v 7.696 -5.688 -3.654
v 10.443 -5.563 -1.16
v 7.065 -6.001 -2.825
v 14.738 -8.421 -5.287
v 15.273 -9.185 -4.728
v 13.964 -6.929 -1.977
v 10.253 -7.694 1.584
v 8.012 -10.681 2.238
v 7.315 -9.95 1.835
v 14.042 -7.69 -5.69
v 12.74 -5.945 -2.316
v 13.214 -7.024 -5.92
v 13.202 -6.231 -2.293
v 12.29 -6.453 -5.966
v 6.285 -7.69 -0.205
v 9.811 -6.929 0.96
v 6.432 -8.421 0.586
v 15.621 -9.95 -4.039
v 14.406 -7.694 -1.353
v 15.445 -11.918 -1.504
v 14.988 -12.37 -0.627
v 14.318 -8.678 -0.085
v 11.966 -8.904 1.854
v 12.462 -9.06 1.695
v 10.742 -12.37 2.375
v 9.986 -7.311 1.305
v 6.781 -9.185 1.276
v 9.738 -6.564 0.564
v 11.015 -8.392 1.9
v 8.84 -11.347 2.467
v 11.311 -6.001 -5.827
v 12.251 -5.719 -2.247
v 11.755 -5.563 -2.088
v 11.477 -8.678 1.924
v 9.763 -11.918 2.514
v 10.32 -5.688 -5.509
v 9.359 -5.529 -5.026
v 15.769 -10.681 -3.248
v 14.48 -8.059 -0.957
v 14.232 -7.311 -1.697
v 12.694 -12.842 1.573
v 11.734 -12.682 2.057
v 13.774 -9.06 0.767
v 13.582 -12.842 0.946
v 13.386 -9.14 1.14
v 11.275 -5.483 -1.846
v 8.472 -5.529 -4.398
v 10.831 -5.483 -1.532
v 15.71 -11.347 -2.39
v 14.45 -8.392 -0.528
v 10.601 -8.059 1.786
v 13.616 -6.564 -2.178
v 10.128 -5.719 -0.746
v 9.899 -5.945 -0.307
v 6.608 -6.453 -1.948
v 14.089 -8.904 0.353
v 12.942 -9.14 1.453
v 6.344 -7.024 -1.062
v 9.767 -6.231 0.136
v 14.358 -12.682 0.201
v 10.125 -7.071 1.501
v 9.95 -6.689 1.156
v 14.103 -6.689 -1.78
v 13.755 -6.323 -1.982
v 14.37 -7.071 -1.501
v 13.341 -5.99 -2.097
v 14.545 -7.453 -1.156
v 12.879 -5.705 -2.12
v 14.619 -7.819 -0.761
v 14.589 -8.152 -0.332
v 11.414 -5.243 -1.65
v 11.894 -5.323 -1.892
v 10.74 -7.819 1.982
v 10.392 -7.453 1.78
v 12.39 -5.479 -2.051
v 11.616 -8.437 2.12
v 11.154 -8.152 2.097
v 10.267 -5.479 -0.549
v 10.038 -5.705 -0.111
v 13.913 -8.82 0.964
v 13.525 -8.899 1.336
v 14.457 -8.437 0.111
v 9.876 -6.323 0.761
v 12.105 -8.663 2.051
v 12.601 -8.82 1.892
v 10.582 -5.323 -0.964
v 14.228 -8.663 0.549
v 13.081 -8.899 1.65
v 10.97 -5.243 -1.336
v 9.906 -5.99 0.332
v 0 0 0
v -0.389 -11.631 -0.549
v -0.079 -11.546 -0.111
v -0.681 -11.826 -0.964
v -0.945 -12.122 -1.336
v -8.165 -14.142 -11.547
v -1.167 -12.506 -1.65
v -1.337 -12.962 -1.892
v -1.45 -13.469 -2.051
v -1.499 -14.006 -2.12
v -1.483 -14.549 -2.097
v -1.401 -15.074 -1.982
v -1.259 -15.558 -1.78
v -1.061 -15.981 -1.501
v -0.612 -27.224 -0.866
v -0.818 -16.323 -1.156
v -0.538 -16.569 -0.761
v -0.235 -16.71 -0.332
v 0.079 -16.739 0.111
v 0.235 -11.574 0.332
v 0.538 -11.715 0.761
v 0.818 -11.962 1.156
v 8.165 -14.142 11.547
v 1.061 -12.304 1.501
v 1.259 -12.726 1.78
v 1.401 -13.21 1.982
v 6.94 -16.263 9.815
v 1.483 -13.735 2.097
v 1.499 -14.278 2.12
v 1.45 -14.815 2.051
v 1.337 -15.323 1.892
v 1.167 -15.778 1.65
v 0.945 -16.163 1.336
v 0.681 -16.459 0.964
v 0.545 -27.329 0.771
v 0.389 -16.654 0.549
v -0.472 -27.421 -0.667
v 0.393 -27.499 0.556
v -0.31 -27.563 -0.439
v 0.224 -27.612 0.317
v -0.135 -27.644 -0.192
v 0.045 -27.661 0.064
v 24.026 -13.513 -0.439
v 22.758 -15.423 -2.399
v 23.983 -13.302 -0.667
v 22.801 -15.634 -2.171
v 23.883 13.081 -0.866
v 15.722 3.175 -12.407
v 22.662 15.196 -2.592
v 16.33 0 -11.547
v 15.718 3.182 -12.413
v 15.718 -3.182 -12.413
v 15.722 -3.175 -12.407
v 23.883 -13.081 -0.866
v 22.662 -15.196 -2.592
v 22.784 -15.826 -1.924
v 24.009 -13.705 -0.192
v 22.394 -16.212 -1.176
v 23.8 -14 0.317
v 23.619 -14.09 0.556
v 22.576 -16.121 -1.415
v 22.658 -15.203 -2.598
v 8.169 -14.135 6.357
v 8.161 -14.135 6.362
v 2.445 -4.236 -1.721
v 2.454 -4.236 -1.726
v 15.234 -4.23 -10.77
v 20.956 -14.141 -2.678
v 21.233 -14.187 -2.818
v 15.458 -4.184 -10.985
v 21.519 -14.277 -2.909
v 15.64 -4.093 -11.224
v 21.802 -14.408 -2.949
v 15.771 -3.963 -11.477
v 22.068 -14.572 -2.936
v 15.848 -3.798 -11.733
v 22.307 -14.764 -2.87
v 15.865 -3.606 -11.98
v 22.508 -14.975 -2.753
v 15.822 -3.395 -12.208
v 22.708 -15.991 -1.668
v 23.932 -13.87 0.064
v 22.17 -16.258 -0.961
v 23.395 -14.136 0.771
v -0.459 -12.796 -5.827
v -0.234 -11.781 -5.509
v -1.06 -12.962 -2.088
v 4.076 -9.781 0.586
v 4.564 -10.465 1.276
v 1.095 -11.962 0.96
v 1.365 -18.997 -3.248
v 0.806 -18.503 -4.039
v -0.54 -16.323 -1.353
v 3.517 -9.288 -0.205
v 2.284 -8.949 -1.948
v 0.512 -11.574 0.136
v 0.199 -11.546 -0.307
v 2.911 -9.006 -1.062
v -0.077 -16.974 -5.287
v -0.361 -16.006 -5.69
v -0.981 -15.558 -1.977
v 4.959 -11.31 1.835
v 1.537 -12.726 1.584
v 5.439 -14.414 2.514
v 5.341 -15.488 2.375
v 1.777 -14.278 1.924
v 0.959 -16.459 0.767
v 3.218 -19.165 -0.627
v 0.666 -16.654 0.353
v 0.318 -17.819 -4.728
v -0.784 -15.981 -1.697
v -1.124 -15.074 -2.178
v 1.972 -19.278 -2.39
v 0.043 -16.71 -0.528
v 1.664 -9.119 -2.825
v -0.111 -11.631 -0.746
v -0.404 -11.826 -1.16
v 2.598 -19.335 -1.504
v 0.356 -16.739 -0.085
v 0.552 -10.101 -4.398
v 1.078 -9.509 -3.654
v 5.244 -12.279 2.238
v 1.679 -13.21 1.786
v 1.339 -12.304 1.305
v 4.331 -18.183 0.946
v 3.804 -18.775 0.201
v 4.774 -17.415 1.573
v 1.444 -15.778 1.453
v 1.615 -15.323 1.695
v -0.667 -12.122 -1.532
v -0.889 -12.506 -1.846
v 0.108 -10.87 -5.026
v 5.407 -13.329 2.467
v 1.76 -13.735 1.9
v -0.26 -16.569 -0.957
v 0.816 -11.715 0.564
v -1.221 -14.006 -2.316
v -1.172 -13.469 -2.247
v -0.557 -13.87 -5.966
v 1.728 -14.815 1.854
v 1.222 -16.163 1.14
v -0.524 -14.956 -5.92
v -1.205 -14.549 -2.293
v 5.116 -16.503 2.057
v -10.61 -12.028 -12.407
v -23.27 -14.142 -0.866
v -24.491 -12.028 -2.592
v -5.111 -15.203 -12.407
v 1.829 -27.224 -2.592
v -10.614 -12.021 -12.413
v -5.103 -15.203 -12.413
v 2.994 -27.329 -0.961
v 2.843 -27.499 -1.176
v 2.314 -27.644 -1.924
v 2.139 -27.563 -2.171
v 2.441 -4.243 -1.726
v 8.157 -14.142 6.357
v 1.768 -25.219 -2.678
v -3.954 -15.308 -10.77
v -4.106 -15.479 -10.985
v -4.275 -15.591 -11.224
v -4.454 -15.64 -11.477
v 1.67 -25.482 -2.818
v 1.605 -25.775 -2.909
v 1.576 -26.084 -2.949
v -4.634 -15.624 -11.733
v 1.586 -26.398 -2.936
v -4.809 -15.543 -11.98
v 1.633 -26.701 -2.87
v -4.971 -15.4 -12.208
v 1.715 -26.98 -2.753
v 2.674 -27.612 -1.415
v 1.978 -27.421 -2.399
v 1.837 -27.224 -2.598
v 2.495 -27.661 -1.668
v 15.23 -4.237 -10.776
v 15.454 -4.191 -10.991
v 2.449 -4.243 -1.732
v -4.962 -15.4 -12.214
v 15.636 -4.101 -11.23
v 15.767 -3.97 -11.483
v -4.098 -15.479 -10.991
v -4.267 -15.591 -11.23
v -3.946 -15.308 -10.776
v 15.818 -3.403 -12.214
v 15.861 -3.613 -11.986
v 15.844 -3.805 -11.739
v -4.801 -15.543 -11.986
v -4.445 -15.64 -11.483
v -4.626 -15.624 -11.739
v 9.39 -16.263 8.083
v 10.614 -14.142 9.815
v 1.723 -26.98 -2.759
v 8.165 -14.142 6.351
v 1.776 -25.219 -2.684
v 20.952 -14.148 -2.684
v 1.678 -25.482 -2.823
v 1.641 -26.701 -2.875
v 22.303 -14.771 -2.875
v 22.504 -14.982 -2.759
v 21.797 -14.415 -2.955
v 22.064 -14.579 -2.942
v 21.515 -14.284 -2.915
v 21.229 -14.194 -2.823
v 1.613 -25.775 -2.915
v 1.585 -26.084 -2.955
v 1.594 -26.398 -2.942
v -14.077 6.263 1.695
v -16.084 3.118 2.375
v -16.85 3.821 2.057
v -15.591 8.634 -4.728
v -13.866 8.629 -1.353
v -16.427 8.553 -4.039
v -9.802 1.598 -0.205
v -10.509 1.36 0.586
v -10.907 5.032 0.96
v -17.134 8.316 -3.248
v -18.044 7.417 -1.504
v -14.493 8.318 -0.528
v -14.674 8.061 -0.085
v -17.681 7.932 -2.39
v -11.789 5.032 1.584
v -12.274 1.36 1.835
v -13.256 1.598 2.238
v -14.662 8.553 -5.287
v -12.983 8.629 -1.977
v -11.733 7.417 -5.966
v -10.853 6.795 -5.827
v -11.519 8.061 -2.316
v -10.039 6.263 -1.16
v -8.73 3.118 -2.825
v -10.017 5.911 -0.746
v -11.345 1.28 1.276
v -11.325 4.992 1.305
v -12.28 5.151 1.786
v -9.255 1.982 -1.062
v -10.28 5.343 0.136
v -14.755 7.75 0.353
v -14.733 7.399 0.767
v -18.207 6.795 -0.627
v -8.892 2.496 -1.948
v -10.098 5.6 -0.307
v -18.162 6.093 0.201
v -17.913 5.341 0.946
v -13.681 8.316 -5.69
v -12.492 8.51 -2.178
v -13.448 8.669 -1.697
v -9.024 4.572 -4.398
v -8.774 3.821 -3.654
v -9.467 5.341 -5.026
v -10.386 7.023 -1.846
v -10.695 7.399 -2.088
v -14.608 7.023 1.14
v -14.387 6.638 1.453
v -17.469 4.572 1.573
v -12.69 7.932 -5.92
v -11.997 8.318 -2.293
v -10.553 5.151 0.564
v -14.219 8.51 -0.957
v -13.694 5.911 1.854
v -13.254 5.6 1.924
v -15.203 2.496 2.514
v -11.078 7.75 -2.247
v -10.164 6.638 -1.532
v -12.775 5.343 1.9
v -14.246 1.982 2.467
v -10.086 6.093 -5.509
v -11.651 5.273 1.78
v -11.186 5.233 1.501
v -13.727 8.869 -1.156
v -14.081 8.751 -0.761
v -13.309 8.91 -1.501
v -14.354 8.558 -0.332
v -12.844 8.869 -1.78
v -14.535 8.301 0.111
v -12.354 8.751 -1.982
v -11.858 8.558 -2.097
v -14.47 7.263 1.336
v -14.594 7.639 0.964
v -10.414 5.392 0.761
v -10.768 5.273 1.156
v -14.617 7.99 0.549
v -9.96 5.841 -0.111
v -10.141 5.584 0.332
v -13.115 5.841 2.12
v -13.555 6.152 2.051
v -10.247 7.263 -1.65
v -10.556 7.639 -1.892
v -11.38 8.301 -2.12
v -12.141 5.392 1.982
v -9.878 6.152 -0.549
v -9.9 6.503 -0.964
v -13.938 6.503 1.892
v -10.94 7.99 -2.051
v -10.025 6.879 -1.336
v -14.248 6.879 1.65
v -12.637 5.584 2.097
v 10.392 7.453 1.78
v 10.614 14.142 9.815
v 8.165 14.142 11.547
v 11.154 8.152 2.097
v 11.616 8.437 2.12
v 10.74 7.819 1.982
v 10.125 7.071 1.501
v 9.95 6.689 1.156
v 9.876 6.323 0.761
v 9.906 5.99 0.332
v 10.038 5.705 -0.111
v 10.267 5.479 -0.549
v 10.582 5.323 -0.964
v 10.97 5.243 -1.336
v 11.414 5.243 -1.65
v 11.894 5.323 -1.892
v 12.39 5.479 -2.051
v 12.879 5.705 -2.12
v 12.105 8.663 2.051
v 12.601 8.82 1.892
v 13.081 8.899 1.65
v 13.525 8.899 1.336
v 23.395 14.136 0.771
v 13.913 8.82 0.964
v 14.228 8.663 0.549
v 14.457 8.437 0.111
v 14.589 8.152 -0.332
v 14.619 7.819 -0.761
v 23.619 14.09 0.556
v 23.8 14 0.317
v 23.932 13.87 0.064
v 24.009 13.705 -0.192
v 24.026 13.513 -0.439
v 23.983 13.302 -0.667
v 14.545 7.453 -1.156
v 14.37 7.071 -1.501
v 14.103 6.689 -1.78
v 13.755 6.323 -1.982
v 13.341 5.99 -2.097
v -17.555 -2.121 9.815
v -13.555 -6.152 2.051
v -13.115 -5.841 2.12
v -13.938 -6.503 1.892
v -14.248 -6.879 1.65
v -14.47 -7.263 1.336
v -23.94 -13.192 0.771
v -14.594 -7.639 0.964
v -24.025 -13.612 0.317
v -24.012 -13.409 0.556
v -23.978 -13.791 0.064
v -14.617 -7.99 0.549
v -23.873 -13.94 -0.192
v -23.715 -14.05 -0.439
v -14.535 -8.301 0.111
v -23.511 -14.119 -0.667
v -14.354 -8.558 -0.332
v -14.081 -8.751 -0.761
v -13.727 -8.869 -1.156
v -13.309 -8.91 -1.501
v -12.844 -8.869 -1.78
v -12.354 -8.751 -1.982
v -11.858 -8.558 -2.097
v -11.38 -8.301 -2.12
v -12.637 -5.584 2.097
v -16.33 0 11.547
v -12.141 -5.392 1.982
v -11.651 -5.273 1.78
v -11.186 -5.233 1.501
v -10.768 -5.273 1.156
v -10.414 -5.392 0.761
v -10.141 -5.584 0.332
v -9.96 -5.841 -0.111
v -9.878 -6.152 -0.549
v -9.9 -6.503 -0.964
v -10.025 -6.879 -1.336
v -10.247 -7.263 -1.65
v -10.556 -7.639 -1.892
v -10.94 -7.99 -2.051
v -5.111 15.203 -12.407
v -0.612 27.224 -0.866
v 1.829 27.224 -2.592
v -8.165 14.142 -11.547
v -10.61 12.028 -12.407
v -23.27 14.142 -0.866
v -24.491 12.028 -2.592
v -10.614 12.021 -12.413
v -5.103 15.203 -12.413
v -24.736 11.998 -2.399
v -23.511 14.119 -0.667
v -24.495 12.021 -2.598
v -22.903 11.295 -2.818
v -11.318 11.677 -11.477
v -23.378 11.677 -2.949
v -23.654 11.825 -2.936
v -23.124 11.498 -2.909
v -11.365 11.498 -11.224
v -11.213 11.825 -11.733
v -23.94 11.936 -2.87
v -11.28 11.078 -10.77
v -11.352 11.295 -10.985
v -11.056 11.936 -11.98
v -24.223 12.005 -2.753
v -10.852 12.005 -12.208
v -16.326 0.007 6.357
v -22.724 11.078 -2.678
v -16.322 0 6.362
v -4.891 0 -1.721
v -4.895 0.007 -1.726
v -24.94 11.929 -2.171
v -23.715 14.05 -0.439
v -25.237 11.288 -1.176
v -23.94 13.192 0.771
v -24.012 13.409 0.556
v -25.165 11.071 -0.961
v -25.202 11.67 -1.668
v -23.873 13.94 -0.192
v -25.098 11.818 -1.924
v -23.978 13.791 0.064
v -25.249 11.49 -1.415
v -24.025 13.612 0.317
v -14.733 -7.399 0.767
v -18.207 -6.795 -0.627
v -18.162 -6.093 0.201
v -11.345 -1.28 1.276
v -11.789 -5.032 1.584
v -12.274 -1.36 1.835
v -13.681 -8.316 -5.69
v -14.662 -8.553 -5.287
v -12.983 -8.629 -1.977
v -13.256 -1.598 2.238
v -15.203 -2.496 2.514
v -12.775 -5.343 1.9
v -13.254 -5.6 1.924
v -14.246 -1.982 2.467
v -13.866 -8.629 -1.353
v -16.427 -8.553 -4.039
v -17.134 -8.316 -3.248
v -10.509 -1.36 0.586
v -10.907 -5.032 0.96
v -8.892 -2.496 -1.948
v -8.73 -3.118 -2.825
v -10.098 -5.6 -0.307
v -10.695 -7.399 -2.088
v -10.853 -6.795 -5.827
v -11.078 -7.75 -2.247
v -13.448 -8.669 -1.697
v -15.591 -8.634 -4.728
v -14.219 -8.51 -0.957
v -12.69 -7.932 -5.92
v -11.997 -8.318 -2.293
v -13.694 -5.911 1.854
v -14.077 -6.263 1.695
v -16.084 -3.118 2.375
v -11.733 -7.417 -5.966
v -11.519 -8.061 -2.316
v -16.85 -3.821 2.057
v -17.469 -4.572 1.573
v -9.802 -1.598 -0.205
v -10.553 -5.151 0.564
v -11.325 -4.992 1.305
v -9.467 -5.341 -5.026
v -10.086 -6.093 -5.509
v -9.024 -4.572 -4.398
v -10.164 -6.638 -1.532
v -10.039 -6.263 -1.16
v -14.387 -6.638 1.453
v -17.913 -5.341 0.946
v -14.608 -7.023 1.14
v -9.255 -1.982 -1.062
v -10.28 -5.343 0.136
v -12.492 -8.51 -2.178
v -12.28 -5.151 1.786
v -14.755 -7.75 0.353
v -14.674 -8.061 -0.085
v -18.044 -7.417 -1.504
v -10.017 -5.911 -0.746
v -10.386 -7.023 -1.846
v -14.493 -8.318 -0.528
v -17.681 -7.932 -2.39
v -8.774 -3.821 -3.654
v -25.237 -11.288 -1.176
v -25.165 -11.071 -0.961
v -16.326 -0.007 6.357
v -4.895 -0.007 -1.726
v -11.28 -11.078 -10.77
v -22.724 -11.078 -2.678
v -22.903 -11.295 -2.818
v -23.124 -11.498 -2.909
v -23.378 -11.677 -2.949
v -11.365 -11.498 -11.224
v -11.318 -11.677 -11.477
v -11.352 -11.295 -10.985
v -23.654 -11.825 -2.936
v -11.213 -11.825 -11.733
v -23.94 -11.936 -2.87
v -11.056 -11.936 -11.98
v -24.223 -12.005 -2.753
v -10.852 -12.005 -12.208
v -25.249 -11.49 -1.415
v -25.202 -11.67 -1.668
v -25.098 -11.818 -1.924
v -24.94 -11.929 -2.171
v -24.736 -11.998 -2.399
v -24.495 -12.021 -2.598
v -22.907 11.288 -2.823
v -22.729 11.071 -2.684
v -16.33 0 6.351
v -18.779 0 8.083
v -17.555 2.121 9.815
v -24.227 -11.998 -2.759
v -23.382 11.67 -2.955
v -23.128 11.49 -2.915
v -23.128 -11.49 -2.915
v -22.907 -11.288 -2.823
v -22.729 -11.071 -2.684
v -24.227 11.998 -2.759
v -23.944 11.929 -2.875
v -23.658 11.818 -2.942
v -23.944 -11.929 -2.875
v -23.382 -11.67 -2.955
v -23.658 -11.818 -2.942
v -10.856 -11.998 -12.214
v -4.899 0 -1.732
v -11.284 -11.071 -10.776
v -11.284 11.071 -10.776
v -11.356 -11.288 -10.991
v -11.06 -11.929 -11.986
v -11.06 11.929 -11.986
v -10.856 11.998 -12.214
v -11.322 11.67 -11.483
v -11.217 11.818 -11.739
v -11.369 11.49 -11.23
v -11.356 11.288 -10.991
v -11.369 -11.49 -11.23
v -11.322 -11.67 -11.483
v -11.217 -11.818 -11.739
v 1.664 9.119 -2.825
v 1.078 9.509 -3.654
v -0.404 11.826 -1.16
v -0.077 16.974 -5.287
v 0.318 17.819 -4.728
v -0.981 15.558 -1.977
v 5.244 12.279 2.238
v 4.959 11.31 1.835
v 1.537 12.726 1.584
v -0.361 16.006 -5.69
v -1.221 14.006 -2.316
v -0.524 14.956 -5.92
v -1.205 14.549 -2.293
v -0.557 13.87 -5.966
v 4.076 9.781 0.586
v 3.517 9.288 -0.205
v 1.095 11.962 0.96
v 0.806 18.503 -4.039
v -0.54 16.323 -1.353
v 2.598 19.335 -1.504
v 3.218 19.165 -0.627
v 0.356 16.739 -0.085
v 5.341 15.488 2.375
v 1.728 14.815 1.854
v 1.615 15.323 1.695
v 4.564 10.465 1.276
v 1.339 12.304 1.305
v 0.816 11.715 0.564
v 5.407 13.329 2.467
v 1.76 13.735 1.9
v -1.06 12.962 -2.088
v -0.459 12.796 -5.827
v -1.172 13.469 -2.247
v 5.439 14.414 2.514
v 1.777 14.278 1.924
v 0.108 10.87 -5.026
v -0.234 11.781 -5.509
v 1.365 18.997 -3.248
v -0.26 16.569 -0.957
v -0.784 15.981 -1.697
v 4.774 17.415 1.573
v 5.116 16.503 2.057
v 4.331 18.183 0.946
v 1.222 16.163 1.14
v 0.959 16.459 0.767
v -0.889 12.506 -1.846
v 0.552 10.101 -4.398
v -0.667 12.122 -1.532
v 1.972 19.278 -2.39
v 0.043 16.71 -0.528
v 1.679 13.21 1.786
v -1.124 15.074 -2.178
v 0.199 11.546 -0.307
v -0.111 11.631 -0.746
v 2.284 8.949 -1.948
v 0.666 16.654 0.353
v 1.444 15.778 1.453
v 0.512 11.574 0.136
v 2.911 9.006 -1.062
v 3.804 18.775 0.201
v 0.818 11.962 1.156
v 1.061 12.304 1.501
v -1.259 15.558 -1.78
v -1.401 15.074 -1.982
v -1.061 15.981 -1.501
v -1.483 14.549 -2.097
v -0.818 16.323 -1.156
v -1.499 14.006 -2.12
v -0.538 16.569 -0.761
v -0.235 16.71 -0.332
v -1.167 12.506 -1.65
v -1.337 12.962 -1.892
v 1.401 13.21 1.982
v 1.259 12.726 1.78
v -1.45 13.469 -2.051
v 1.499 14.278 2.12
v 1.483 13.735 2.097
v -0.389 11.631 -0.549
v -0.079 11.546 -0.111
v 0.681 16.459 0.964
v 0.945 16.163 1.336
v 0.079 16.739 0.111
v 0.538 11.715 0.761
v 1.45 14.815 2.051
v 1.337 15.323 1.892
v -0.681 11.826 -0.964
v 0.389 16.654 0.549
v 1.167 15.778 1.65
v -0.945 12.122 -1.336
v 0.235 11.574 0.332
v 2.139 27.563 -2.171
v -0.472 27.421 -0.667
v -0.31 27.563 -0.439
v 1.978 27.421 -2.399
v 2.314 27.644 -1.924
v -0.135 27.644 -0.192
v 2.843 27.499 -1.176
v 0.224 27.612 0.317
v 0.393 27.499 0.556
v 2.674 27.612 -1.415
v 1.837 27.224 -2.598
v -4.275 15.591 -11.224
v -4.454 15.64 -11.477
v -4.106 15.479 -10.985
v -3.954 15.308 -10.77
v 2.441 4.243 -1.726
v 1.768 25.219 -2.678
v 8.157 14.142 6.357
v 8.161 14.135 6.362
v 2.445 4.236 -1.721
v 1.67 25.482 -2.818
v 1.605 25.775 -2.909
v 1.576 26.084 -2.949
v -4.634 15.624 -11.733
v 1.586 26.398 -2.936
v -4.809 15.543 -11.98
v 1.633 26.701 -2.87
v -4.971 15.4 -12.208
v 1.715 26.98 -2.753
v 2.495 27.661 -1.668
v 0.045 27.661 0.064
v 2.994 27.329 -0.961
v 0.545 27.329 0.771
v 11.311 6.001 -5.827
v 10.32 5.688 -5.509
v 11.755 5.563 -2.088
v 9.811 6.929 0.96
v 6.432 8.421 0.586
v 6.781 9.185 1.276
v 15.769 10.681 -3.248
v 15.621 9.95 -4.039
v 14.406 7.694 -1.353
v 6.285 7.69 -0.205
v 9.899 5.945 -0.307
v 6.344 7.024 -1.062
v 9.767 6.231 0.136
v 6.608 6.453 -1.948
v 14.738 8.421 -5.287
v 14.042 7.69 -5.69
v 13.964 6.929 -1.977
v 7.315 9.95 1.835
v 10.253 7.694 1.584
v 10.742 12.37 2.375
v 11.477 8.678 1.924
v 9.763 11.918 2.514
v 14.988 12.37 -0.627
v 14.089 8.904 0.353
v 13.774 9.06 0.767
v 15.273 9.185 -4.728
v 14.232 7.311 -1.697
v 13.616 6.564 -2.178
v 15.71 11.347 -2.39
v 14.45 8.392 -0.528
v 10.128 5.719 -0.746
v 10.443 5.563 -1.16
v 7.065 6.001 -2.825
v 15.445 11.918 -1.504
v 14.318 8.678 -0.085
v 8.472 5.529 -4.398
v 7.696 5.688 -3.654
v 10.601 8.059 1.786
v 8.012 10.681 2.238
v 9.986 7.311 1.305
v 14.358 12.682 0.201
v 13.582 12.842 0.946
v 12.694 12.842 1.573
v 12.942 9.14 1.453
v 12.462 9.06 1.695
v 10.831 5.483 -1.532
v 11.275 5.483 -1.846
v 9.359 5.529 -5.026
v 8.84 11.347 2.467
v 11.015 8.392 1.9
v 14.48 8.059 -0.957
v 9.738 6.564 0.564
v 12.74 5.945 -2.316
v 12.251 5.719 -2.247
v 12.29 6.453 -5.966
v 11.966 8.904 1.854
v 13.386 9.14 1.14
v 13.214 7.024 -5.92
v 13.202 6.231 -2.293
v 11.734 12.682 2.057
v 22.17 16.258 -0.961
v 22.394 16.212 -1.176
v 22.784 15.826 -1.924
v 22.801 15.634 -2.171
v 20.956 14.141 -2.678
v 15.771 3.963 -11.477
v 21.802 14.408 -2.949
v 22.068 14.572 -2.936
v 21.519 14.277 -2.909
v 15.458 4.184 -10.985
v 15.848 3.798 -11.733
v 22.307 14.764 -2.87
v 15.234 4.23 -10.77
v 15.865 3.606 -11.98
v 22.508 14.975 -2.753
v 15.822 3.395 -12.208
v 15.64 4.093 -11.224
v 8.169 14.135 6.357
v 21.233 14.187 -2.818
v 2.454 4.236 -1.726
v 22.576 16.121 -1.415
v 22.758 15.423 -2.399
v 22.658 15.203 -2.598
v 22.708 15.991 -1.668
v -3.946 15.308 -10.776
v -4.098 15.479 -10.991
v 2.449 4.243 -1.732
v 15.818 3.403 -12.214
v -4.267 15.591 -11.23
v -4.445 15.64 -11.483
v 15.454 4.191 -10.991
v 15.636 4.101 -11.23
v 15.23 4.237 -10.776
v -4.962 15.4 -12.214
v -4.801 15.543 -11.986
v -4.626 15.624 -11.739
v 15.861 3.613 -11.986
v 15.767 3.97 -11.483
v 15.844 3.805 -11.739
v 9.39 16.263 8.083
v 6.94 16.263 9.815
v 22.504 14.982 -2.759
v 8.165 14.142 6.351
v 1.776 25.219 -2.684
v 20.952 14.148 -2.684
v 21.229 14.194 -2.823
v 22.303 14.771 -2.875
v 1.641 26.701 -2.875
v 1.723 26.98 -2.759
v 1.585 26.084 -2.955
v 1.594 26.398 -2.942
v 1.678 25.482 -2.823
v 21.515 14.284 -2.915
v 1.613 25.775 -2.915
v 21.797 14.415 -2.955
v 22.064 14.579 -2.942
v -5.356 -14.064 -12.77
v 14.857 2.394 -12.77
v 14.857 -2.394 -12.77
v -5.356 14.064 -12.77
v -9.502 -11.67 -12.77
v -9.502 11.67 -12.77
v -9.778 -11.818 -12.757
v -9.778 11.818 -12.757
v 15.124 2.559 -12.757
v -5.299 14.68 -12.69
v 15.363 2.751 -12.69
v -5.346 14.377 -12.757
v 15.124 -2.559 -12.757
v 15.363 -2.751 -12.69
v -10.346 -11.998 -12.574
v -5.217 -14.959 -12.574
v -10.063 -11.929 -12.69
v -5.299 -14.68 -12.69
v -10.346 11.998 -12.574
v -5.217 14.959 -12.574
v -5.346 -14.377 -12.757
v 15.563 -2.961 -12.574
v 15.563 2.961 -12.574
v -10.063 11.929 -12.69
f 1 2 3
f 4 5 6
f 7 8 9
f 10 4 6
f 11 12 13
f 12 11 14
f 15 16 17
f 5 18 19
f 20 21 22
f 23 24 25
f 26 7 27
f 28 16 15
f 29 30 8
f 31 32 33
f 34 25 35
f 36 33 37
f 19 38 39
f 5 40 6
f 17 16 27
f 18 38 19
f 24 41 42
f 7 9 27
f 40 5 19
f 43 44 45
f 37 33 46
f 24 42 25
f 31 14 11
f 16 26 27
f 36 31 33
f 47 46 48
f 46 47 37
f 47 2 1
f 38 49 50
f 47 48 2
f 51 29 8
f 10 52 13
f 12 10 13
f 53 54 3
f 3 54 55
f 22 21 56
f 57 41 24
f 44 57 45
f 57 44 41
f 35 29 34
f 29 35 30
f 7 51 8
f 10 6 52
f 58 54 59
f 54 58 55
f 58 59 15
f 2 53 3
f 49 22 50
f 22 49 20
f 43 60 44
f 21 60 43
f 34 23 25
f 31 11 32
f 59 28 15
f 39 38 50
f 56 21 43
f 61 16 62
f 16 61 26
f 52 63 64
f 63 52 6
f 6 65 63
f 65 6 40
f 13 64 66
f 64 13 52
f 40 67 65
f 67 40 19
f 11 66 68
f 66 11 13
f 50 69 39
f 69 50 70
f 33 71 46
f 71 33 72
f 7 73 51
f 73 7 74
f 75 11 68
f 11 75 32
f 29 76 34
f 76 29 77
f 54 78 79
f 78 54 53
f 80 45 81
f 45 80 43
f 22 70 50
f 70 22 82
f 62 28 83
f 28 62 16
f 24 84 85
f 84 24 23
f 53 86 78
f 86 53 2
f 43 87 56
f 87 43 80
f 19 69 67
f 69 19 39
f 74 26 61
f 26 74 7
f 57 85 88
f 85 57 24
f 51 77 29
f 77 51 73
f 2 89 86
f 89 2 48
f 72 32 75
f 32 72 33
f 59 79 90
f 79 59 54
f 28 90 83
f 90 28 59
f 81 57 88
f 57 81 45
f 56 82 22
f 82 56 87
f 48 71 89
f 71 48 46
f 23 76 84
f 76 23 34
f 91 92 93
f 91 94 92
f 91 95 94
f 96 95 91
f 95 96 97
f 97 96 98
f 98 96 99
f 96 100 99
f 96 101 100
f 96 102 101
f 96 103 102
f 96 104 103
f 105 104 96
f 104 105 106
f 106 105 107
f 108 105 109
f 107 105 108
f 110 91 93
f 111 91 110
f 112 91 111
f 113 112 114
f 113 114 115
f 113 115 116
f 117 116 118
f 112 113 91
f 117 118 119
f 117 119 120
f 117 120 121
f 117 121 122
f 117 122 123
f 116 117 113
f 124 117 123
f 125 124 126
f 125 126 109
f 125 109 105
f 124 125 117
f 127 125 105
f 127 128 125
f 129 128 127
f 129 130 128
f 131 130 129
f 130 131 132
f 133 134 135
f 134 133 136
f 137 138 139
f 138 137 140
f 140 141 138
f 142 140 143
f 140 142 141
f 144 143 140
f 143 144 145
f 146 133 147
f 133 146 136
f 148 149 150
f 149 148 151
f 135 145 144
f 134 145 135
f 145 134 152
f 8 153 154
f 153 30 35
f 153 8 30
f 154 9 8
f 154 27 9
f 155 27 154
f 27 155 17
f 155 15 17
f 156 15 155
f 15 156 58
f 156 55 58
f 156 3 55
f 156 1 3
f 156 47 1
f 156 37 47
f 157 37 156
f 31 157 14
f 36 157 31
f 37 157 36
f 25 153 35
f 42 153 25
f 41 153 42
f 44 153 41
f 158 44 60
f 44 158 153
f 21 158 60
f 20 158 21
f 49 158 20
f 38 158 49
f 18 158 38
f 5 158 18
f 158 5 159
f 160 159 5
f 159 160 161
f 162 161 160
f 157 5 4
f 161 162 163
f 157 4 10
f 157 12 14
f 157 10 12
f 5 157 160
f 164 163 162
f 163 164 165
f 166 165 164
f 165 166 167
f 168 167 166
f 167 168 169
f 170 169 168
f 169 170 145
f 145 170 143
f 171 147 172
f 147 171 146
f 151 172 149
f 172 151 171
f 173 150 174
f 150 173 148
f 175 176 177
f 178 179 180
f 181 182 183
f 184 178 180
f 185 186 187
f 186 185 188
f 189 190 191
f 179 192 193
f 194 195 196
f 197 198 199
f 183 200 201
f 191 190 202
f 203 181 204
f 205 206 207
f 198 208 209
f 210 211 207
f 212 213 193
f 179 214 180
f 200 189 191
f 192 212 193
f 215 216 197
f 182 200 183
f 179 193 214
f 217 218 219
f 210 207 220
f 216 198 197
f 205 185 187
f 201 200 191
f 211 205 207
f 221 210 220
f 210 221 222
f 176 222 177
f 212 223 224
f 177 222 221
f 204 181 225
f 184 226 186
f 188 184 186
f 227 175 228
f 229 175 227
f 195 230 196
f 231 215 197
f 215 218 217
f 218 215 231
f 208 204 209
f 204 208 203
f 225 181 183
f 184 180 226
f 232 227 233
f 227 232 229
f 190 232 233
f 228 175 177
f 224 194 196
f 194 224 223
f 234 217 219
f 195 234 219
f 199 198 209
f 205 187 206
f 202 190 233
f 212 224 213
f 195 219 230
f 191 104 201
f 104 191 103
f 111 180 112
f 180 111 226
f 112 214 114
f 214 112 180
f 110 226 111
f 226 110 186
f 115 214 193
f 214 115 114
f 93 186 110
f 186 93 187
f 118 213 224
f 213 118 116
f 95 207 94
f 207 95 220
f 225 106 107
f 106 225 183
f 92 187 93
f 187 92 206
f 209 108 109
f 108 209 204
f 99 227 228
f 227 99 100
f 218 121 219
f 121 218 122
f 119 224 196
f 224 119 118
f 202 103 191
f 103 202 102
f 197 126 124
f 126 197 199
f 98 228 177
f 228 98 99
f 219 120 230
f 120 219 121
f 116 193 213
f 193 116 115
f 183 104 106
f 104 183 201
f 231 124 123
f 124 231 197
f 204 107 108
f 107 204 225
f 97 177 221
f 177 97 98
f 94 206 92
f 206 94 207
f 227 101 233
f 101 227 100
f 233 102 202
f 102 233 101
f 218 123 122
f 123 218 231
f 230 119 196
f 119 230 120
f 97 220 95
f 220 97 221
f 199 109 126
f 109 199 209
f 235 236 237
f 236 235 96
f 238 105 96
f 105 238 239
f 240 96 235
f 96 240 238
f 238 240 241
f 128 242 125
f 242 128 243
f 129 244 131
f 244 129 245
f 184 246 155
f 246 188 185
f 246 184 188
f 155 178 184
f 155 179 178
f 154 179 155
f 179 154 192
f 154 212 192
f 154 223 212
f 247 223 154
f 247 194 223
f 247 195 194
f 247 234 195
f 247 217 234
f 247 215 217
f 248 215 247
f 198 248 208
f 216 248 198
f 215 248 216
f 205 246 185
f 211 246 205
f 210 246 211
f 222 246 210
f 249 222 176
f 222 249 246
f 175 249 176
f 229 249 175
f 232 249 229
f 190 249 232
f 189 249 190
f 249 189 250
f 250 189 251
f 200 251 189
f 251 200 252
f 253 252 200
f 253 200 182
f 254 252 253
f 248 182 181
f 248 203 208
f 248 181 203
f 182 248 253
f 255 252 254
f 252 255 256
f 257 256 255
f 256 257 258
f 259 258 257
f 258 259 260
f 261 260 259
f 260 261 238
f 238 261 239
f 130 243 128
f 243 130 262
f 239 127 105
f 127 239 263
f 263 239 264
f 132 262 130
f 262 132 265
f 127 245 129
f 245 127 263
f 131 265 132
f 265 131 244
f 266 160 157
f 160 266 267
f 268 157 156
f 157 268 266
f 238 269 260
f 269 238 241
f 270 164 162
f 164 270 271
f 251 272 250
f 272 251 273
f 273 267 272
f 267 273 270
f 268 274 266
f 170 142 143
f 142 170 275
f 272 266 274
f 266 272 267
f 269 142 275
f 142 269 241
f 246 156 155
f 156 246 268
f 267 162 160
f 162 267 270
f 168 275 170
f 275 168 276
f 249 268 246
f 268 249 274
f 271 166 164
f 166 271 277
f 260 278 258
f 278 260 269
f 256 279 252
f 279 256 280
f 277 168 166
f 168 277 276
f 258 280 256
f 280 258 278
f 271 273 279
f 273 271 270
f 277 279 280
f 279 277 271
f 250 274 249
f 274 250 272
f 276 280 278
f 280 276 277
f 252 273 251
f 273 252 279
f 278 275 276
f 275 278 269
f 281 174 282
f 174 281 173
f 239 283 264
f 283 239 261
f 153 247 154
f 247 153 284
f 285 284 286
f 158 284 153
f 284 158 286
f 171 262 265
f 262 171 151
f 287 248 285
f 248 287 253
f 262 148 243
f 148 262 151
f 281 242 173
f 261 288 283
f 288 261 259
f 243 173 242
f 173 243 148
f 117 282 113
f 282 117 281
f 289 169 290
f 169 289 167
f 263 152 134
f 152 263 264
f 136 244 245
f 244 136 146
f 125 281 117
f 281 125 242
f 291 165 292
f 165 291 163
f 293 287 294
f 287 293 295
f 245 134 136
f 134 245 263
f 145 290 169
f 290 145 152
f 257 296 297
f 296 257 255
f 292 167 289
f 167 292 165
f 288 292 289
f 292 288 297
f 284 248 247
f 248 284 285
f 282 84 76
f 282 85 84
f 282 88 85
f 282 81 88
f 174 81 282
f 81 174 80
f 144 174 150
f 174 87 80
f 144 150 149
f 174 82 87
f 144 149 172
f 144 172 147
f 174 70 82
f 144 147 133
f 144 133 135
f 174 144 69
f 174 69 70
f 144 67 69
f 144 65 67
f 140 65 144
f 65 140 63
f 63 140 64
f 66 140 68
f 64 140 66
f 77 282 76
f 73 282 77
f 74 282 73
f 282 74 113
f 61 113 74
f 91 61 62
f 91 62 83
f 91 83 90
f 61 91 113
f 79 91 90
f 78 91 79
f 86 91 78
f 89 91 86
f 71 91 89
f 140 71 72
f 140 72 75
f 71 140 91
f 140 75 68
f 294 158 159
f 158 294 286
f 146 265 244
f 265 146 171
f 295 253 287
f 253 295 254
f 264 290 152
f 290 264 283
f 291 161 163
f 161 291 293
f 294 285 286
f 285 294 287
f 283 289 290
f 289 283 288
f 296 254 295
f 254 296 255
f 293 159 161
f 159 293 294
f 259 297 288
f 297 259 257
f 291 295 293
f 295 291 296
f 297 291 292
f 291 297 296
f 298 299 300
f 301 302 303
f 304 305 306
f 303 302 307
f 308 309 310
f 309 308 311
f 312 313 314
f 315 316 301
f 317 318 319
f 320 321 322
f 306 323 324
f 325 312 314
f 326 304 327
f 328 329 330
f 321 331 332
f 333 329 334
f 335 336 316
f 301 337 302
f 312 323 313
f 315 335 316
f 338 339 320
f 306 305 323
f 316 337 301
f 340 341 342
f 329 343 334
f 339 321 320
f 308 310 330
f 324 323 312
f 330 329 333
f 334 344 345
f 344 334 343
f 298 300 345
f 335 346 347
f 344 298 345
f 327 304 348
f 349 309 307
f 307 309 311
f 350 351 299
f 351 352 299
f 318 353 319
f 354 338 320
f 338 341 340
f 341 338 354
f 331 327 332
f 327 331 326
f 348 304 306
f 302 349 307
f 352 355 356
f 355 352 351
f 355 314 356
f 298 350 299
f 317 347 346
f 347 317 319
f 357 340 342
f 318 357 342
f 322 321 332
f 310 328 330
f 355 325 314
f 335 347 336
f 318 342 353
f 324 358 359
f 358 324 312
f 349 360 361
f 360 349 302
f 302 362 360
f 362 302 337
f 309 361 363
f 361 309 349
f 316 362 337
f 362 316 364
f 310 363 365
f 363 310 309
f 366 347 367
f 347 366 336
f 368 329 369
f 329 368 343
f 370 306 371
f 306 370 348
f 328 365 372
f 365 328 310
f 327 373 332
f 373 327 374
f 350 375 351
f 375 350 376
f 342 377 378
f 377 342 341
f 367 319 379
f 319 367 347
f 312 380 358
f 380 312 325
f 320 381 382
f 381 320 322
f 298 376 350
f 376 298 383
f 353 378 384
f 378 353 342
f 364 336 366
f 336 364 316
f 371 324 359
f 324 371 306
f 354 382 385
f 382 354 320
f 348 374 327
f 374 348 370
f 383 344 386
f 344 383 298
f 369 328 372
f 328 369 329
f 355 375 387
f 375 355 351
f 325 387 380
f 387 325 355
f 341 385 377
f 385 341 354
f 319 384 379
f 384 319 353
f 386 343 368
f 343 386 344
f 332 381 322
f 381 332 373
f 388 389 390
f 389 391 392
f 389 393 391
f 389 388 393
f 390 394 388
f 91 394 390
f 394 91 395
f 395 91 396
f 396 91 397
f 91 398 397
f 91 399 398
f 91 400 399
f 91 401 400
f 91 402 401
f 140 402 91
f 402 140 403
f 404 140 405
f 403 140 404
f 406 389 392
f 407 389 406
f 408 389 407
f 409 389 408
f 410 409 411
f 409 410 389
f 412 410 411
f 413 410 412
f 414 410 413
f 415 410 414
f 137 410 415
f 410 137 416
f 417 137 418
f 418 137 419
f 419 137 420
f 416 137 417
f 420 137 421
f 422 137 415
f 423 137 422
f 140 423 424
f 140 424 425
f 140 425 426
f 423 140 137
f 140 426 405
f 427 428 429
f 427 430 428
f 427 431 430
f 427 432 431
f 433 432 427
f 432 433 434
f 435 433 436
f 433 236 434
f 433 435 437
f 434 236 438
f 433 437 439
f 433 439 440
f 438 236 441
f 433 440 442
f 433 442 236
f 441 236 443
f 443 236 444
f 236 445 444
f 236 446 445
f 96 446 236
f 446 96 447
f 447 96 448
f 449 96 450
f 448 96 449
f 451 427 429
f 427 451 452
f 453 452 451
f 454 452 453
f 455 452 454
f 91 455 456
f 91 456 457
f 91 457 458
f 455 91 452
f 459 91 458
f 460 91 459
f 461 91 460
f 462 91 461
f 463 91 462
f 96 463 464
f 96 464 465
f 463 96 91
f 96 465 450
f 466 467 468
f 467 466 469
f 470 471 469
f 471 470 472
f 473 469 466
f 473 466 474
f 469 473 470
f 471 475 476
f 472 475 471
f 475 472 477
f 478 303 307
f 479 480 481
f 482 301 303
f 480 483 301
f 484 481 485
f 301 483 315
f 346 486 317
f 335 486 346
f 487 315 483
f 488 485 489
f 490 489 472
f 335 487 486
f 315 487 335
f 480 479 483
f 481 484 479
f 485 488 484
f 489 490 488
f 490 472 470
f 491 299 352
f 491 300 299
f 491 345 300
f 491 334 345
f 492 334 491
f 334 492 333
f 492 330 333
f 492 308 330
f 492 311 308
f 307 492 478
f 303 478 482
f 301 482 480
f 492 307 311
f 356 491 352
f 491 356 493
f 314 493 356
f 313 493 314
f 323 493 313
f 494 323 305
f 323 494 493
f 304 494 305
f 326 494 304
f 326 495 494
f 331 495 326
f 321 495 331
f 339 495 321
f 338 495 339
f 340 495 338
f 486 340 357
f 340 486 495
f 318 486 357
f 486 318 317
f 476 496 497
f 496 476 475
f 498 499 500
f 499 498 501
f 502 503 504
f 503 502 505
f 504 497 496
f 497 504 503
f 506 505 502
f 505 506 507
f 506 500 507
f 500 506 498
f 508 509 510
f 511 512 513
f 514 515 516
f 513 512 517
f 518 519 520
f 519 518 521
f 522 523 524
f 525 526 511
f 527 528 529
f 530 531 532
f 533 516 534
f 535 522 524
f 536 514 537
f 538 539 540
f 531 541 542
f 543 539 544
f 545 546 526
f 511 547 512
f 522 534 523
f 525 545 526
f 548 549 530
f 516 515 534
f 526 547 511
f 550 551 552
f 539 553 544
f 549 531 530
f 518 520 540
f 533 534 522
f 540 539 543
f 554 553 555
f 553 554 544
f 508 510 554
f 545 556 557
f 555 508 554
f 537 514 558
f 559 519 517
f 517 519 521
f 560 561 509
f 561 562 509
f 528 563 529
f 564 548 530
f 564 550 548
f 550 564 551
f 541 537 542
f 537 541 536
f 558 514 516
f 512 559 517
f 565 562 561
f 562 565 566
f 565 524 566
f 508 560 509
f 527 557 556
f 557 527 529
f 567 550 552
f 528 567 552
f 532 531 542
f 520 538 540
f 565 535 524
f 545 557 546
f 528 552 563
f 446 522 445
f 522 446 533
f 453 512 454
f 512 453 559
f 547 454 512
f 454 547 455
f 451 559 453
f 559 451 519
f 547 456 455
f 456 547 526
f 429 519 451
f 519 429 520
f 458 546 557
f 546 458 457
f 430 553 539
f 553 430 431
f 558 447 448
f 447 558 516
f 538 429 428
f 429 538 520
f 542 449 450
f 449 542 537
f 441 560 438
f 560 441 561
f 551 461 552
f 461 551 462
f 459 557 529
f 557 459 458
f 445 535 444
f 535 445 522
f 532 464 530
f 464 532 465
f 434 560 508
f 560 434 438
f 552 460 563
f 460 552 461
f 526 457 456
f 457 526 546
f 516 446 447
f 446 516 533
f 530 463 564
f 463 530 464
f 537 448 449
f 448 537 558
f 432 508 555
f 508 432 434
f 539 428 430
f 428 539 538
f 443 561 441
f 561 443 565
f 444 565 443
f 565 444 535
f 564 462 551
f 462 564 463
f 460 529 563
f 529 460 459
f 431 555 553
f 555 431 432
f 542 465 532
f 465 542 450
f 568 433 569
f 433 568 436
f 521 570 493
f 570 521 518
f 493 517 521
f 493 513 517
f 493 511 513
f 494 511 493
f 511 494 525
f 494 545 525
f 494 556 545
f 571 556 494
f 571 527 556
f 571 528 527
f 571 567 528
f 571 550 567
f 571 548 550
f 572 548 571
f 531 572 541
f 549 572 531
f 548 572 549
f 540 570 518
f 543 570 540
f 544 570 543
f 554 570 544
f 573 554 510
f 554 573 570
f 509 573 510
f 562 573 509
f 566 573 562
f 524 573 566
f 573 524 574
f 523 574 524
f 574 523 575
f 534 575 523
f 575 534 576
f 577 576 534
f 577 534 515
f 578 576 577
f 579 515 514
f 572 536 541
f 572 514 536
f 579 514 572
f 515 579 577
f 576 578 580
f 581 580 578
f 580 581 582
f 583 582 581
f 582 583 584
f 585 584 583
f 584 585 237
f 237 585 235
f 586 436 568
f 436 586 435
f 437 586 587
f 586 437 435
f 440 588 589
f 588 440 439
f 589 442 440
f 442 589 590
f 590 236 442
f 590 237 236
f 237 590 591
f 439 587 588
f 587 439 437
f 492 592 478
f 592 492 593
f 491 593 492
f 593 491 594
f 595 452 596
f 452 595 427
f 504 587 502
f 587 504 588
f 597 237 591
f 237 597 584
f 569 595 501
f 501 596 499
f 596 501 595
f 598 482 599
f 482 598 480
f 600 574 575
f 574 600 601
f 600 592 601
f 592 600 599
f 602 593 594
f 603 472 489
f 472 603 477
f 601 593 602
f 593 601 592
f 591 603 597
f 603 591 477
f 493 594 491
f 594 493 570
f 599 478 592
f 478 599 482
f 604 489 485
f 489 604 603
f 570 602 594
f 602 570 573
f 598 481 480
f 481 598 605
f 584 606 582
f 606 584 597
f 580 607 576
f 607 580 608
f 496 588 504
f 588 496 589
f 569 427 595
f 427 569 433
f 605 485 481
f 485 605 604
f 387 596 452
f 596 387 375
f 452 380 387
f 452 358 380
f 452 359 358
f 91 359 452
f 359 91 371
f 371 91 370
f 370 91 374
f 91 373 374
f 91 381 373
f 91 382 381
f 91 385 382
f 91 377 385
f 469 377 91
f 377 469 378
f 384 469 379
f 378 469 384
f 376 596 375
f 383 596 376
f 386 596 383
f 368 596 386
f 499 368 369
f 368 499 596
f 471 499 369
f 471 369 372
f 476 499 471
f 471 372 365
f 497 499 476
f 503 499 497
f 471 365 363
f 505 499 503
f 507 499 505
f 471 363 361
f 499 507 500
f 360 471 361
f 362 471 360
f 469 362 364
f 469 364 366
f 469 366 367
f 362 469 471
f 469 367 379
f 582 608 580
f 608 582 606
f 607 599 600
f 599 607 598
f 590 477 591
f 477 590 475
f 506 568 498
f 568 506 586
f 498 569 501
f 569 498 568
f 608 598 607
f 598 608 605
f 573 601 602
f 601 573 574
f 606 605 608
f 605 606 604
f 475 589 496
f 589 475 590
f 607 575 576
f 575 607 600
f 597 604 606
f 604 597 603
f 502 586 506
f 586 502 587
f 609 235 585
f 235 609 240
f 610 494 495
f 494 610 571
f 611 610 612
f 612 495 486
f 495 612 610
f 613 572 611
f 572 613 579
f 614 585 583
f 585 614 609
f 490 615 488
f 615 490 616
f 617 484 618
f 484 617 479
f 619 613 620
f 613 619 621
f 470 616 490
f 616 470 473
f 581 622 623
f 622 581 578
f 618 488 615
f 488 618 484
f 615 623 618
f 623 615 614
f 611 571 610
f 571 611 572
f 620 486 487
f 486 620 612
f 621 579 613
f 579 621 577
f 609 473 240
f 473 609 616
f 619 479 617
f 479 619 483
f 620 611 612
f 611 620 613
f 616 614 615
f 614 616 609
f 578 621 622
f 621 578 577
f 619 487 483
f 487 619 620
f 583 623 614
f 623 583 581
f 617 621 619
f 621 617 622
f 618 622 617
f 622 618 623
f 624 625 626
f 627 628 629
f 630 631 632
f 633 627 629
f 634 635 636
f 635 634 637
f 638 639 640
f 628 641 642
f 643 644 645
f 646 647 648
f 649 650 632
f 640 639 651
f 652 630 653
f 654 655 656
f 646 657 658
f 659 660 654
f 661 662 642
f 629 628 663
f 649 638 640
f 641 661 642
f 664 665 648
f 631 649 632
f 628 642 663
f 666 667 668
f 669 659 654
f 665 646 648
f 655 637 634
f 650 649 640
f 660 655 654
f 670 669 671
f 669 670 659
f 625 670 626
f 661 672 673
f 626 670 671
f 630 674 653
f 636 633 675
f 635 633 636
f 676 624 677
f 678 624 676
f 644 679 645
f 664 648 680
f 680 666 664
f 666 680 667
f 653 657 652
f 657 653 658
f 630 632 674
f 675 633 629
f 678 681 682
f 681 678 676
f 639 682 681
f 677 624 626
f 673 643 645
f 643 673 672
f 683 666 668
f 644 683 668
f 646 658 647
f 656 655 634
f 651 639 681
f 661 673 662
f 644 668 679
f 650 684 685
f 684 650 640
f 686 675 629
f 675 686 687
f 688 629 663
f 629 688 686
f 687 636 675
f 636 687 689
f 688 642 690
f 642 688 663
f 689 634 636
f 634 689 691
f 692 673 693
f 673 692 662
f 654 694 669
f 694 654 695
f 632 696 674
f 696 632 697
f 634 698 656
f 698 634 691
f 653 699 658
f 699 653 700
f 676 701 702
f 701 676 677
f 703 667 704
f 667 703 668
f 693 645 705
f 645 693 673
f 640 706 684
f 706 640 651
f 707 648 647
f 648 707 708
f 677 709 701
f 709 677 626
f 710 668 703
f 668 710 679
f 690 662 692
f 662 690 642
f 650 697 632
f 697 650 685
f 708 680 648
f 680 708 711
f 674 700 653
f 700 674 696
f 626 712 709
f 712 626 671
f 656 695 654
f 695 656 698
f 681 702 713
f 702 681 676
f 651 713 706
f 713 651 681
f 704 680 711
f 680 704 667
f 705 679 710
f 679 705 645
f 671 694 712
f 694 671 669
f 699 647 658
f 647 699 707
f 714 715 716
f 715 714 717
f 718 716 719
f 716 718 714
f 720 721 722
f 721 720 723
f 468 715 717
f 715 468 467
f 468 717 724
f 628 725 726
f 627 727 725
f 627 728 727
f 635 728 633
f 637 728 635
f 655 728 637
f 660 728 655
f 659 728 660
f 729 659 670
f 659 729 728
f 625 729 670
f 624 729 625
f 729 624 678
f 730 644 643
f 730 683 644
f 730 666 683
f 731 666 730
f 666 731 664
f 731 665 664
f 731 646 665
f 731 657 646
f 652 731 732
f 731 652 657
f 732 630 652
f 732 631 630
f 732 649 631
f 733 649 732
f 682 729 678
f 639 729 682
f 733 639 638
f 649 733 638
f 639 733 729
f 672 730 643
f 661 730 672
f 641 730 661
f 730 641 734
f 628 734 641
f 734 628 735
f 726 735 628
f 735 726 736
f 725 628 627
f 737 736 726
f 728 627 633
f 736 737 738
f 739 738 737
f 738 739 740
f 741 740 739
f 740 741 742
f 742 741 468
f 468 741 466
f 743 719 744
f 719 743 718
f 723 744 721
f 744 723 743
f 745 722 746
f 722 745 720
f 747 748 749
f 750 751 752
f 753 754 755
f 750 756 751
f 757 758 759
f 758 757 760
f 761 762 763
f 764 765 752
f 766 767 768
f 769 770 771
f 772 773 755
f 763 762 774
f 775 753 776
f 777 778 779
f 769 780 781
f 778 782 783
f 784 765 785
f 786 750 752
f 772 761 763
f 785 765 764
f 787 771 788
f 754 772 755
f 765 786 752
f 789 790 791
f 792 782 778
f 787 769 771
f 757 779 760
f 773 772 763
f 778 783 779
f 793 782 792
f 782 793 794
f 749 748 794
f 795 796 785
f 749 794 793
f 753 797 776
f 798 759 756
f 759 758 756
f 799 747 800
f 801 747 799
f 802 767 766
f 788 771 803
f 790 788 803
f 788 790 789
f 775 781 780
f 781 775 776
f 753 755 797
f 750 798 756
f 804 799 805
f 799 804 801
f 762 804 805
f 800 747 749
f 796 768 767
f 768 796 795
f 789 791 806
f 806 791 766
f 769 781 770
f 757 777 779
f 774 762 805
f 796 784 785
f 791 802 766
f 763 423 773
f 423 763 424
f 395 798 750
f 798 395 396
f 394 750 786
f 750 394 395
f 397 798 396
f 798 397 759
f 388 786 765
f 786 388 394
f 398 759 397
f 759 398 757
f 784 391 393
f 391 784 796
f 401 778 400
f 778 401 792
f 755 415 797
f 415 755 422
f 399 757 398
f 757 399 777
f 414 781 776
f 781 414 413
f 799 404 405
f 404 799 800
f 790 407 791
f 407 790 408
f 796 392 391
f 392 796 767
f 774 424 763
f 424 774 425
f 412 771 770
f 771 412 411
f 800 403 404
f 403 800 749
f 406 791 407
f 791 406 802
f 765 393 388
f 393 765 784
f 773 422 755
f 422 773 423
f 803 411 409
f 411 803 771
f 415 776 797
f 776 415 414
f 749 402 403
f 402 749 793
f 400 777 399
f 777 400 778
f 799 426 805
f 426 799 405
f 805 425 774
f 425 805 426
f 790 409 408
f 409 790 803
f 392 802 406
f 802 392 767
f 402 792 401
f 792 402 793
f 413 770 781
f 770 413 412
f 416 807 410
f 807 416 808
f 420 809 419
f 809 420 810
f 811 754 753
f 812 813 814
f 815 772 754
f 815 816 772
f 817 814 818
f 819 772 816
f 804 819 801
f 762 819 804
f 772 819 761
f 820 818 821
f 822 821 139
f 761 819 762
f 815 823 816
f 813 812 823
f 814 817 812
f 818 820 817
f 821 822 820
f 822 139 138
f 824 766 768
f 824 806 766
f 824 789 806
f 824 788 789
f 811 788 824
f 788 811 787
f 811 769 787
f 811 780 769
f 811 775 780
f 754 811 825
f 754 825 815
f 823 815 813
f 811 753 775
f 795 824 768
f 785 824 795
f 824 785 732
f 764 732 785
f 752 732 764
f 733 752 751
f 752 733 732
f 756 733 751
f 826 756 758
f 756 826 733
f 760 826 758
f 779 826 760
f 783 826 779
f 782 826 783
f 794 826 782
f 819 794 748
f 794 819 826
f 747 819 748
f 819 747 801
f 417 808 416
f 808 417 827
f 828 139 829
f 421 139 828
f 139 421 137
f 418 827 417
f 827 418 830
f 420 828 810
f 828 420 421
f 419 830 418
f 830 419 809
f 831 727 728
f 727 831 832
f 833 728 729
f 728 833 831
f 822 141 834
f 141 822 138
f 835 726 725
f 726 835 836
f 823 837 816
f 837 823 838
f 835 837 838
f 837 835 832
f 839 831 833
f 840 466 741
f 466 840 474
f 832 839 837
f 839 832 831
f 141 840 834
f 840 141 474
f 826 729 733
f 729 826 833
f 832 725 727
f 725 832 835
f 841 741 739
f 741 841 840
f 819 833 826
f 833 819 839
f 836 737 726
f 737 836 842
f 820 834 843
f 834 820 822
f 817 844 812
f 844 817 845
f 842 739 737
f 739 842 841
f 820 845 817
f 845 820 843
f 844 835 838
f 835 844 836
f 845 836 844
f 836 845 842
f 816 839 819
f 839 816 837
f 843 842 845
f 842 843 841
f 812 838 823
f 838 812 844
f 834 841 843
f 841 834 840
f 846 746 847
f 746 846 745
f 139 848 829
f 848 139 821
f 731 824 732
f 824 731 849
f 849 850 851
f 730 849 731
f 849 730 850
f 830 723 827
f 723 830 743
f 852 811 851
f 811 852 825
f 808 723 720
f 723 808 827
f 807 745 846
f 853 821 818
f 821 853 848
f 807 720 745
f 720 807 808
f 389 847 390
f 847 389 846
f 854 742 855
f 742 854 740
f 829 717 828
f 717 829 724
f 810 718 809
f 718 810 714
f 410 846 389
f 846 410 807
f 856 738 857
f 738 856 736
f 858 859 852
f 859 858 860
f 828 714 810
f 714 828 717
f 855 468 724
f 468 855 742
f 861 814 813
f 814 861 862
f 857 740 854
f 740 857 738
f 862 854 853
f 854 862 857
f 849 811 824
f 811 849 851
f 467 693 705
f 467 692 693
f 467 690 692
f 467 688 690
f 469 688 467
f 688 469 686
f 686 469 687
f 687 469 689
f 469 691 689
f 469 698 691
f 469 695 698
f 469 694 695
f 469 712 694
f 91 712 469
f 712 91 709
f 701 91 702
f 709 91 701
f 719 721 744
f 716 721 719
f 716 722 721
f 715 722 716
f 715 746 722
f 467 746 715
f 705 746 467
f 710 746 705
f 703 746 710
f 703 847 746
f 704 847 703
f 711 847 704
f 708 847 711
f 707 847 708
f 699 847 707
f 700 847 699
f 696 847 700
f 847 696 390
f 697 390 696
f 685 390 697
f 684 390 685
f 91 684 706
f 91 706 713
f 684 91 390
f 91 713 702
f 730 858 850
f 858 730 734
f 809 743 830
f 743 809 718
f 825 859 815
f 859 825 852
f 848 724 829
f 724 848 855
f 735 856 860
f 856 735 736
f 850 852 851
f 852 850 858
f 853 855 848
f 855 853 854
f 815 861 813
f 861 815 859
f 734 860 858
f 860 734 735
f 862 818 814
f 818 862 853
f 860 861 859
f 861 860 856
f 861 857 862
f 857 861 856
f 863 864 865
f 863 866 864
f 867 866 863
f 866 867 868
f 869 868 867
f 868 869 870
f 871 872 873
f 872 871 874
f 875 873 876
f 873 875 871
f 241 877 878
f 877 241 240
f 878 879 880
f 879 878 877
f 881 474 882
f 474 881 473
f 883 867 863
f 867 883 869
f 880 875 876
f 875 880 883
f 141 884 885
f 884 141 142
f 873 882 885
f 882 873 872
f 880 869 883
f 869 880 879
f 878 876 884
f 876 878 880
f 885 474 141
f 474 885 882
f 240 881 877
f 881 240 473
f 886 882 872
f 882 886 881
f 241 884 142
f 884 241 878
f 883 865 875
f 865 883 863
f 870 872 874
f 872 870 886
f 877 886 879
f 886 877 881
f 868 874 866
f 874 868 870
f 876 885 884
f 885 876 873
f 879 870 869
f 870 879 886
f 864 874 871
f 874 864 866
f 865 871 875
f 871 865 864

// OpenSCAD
part = "inside"; // [inside: Inner Corners, outside: Outer Corners, tee: Tee Connector]

// Size of extrusion
extrusionSize = 20;

// Diameter of screwholes
screwSize = 5.2;

// Thickness of material
thickness = 3;

// Size of corner struts
strutSize = 20;

/* [Hidden] */
$fn=30;
// Radius of outer corners
cornerRadius = thickness; // This could be a variable, but it makes things less clean

if (part == "inside") rotate([135,35.26439,0]) tripleBracket();
else if (part == "outside") tripleEnd();
else if (part == "tee") teeBracket();

module tripleBracket()
{
    union()
    difference()
    {
        union()
        {
            translate([0,extrusionSize/2,0]) cornerBracket();
            rotate([0,0,270]) translate([0,-extrusionSize/2,0]) cornerBracket();
            rotate([270,0,270]) translate([0,extrusionSize/2,0]) cornerBracket();
            
            // add triangle base for printing
            hull()
            {
                translate([0,thickness/2,0]) sideWall();
                rotate([0,0,270]) translate([0,-thickness/2,0]) sideWall();
                rotate([270,0,270]) translate([0,thickness/2,0]) sideWall();
            }
        }
        
        // remove corners again
        translate([-extrusionSize/2,extrusionSize/2,extrusionSize/2]) cube([extrusionSize, extrusionSize, 2*extrusionSize], center=true);
        translate([extrusionSize/2,extrusionSize/2,-extrusionSize/2]) cube([2*extrusionSize,extrusionSize,extrusionSize], center=true);
        translate([-extrusionSize/2,-extrusionSize/2,-extrusionSize/2]) cube([extrusionSize,2*extrusionSize,extrusionSize], center=true);
    }
}

module tripleEnd()
{
    union()
    {
        translate([extrusionSize/2,extrusionSize/2,0]) faceCover();
        translate([0,extrusionSize/2,extrusionSize/2]) rotate([0,90,0]) faceCover();
        translate([extrusionSize/2,0,extrusionSize/2]) rotate([-90,0,0]) faceCover();
        
        // adding small corner supports
        translate([0,extrusionSize-thickness/2,0]) sideWall(thickness,strutSize);
        translate([extrusionSize-thickness/2,0,0]) rotate([0,0,90]) sideWall(thickness,strutSize);
        translate([0,0,extrusionSize-thickness/2]) rotate([-90,0,0]) sideWall(thickness,strutSize);
        
        // final sharp corner
        translate([thickness/2,thickness/2,thickness/2]) cube([thickness,thickness,thickness], center=true);
    }
}

module teeBracket()
{
    difference()
    {
        
        // make the base
        translate([0,0,(extrusionSize+thickness)/2])hull()
        {
            translate([-(extrusionSize-cornerRadius)/2, -(3*extrusionSize)/2, 0]) cylinder(d=cornerRadius, h=extrusionSize+thickness, center=true);
            translate([-(extrusionSize-cornerRadius)/2, (3*extrusionSize)/2, 0]) cylinder(d=cornerRadius, h=extrusionSize+thickness, center=true);
            translate([(extrusionSize)/2, -(3*extrusionSize)/2, 0]) cylinder(d=cornerRadius, h=extrusionSize+thickness, center=true);
            translate([(extrusionSize)/2, (3*extrusionSize)/2, 0]) cylinder(d=cornerRadius, h=extrusionSize+thickness, center=true);
            translate([(3*extrusionSize)/2, -(extrusionSize)/2, 0]) cylinder(d=cornerRadius, h=extrusionSize+thickness, center=true);
            translate([(3*extrusionSize)/2, (extrusionSize)/2, 0]) cylinder(d=cornerRadius, h=extrusionSize+thickness, center=true);
        }
        
        // remove the extrusion spaces
        translate([0,0,extrusionSize/2+thickness+.05]) 
        {
            cube([extrusionSize+.1, 4*extrusionSize, extrusionSize+.1], center=true);
            cube([4*extrusionSize, extrusionSize+.1, extrusionSize+.1], center=true);
        }
        
        // remove the space for screw access
        translate([0, 0, (extrusionSize+thickness)/2])
        {
            translate([extrusionSize+thickness, -(extrusionSize+thickness), 0]) cube([extrusionSize, extrusionSize, extrusionSize-thickness], center=true);
            translate([extrusionSize+thickness, (extrusionSize+thickness), 0]) cube([extrusionSize, extrusionSize, extrusionSize-thickness], center=true);
        }
        
        // remove base screw holes
        translate([0,0,0]) counterSunk();
        translate([0,-extrusionSize,0]) counterSunk();
        translate([0,extrusionSize,0]) counterSunk();
        translate([extrusionSize,0,0]) counterSunk();
        
        translate([extrusionSize/2+thickness, -extrusionSize, extrusionSize/2+thickness]) rotate([0,-90,0]) counterSunk();
        translate([extrusionSize/2+thickness, extrusionSize, extrusionSize/2+thickness]) rotate([0,-90,0]) counterSunk();
        translate([extrusionSize, -(extrusionSize/2+thickness), extrusionSize/2+thickness]) rotate([-90,0,0]) counterSunk();
        translate([extrusionSize, (extrusionSize/2+thickness), extrusionSize/2+thickness]) rotate([90,0,0]) counterSunk();
        
    }
}
module cornerBracket()
{
    union()
    {
        translate([0, -(extrusionSize-thickness)/2, 0]) sideWall(thickness,strutSize);
        translate([0, (extrusionSize-thickness)/2, 0]) sideWall(thickness,strutSize);
        
        translate([extrusionSize/2, 0, -0.01]) faceCover();
        translate([-0.01, 0, extrusionSize/2]) rotate([0,90,0])faceCover();
    }
}

module faceCover()
{
    difference()
    {
        hull() // square pad
        {
            translate([-(extrusionSize-cornerRadius)/2,-(extrusionSize-cornerRadius)/2,thickness/2]) cylinder(d=cornerRadius,h=thickness,center=true);
            translate([(extrusionSize-cornerRadius)/2,-(extrusionSize-cornerRadius)/2,thickness/2]) cylinder(d=cornerRadius,h=thickness,center=true);
            translate([-(extrusionSize-cornerRadius)/2,(extrusionSize-cornerRadius)/2,thickness/2]) cylinder(d=cornerRadius,h=thickness,center=true);
            translate([(extrusionSize-cornerRadius)/2,(extrusionSize-cornerRadius)/2,thickness/2]) cylinder(d=cornerRadius,h=thickness,center=true);
        }
        
        // screw hole
        translate([0,0,thickness]) rotate([180,0,0]) counterSunk();
    }
}

module sideWall(thickness=thickness, extrusionSize=extrusionSize)
{
    hull()
    {
        translate([thickness/2, 0, thickness/2]) cube([thickness, thickness, thickness], center = true);
        translate([extrusionSize-thickness/2, 0, thickness/2]) cylinder(d=thickness, h=thickness, center=true);
        translate([thickness/2, 0, extrusionSize-thickness/2]) rotate([0,90,0]) cylinder(d=thickness, h=thickness, center=true);

    }
}
module counterSunk(holeSize = screwSize)
{
    hull()
    {
        translate([0,0,-1]) cylinder(d=holeSize*2,h=2,center=true);
        translate([0,0,holeSize/2]) cylinder(d=holeSize,h=.1,center=true);
    }     
    cylinder(d=holeSize,h=10);
}
